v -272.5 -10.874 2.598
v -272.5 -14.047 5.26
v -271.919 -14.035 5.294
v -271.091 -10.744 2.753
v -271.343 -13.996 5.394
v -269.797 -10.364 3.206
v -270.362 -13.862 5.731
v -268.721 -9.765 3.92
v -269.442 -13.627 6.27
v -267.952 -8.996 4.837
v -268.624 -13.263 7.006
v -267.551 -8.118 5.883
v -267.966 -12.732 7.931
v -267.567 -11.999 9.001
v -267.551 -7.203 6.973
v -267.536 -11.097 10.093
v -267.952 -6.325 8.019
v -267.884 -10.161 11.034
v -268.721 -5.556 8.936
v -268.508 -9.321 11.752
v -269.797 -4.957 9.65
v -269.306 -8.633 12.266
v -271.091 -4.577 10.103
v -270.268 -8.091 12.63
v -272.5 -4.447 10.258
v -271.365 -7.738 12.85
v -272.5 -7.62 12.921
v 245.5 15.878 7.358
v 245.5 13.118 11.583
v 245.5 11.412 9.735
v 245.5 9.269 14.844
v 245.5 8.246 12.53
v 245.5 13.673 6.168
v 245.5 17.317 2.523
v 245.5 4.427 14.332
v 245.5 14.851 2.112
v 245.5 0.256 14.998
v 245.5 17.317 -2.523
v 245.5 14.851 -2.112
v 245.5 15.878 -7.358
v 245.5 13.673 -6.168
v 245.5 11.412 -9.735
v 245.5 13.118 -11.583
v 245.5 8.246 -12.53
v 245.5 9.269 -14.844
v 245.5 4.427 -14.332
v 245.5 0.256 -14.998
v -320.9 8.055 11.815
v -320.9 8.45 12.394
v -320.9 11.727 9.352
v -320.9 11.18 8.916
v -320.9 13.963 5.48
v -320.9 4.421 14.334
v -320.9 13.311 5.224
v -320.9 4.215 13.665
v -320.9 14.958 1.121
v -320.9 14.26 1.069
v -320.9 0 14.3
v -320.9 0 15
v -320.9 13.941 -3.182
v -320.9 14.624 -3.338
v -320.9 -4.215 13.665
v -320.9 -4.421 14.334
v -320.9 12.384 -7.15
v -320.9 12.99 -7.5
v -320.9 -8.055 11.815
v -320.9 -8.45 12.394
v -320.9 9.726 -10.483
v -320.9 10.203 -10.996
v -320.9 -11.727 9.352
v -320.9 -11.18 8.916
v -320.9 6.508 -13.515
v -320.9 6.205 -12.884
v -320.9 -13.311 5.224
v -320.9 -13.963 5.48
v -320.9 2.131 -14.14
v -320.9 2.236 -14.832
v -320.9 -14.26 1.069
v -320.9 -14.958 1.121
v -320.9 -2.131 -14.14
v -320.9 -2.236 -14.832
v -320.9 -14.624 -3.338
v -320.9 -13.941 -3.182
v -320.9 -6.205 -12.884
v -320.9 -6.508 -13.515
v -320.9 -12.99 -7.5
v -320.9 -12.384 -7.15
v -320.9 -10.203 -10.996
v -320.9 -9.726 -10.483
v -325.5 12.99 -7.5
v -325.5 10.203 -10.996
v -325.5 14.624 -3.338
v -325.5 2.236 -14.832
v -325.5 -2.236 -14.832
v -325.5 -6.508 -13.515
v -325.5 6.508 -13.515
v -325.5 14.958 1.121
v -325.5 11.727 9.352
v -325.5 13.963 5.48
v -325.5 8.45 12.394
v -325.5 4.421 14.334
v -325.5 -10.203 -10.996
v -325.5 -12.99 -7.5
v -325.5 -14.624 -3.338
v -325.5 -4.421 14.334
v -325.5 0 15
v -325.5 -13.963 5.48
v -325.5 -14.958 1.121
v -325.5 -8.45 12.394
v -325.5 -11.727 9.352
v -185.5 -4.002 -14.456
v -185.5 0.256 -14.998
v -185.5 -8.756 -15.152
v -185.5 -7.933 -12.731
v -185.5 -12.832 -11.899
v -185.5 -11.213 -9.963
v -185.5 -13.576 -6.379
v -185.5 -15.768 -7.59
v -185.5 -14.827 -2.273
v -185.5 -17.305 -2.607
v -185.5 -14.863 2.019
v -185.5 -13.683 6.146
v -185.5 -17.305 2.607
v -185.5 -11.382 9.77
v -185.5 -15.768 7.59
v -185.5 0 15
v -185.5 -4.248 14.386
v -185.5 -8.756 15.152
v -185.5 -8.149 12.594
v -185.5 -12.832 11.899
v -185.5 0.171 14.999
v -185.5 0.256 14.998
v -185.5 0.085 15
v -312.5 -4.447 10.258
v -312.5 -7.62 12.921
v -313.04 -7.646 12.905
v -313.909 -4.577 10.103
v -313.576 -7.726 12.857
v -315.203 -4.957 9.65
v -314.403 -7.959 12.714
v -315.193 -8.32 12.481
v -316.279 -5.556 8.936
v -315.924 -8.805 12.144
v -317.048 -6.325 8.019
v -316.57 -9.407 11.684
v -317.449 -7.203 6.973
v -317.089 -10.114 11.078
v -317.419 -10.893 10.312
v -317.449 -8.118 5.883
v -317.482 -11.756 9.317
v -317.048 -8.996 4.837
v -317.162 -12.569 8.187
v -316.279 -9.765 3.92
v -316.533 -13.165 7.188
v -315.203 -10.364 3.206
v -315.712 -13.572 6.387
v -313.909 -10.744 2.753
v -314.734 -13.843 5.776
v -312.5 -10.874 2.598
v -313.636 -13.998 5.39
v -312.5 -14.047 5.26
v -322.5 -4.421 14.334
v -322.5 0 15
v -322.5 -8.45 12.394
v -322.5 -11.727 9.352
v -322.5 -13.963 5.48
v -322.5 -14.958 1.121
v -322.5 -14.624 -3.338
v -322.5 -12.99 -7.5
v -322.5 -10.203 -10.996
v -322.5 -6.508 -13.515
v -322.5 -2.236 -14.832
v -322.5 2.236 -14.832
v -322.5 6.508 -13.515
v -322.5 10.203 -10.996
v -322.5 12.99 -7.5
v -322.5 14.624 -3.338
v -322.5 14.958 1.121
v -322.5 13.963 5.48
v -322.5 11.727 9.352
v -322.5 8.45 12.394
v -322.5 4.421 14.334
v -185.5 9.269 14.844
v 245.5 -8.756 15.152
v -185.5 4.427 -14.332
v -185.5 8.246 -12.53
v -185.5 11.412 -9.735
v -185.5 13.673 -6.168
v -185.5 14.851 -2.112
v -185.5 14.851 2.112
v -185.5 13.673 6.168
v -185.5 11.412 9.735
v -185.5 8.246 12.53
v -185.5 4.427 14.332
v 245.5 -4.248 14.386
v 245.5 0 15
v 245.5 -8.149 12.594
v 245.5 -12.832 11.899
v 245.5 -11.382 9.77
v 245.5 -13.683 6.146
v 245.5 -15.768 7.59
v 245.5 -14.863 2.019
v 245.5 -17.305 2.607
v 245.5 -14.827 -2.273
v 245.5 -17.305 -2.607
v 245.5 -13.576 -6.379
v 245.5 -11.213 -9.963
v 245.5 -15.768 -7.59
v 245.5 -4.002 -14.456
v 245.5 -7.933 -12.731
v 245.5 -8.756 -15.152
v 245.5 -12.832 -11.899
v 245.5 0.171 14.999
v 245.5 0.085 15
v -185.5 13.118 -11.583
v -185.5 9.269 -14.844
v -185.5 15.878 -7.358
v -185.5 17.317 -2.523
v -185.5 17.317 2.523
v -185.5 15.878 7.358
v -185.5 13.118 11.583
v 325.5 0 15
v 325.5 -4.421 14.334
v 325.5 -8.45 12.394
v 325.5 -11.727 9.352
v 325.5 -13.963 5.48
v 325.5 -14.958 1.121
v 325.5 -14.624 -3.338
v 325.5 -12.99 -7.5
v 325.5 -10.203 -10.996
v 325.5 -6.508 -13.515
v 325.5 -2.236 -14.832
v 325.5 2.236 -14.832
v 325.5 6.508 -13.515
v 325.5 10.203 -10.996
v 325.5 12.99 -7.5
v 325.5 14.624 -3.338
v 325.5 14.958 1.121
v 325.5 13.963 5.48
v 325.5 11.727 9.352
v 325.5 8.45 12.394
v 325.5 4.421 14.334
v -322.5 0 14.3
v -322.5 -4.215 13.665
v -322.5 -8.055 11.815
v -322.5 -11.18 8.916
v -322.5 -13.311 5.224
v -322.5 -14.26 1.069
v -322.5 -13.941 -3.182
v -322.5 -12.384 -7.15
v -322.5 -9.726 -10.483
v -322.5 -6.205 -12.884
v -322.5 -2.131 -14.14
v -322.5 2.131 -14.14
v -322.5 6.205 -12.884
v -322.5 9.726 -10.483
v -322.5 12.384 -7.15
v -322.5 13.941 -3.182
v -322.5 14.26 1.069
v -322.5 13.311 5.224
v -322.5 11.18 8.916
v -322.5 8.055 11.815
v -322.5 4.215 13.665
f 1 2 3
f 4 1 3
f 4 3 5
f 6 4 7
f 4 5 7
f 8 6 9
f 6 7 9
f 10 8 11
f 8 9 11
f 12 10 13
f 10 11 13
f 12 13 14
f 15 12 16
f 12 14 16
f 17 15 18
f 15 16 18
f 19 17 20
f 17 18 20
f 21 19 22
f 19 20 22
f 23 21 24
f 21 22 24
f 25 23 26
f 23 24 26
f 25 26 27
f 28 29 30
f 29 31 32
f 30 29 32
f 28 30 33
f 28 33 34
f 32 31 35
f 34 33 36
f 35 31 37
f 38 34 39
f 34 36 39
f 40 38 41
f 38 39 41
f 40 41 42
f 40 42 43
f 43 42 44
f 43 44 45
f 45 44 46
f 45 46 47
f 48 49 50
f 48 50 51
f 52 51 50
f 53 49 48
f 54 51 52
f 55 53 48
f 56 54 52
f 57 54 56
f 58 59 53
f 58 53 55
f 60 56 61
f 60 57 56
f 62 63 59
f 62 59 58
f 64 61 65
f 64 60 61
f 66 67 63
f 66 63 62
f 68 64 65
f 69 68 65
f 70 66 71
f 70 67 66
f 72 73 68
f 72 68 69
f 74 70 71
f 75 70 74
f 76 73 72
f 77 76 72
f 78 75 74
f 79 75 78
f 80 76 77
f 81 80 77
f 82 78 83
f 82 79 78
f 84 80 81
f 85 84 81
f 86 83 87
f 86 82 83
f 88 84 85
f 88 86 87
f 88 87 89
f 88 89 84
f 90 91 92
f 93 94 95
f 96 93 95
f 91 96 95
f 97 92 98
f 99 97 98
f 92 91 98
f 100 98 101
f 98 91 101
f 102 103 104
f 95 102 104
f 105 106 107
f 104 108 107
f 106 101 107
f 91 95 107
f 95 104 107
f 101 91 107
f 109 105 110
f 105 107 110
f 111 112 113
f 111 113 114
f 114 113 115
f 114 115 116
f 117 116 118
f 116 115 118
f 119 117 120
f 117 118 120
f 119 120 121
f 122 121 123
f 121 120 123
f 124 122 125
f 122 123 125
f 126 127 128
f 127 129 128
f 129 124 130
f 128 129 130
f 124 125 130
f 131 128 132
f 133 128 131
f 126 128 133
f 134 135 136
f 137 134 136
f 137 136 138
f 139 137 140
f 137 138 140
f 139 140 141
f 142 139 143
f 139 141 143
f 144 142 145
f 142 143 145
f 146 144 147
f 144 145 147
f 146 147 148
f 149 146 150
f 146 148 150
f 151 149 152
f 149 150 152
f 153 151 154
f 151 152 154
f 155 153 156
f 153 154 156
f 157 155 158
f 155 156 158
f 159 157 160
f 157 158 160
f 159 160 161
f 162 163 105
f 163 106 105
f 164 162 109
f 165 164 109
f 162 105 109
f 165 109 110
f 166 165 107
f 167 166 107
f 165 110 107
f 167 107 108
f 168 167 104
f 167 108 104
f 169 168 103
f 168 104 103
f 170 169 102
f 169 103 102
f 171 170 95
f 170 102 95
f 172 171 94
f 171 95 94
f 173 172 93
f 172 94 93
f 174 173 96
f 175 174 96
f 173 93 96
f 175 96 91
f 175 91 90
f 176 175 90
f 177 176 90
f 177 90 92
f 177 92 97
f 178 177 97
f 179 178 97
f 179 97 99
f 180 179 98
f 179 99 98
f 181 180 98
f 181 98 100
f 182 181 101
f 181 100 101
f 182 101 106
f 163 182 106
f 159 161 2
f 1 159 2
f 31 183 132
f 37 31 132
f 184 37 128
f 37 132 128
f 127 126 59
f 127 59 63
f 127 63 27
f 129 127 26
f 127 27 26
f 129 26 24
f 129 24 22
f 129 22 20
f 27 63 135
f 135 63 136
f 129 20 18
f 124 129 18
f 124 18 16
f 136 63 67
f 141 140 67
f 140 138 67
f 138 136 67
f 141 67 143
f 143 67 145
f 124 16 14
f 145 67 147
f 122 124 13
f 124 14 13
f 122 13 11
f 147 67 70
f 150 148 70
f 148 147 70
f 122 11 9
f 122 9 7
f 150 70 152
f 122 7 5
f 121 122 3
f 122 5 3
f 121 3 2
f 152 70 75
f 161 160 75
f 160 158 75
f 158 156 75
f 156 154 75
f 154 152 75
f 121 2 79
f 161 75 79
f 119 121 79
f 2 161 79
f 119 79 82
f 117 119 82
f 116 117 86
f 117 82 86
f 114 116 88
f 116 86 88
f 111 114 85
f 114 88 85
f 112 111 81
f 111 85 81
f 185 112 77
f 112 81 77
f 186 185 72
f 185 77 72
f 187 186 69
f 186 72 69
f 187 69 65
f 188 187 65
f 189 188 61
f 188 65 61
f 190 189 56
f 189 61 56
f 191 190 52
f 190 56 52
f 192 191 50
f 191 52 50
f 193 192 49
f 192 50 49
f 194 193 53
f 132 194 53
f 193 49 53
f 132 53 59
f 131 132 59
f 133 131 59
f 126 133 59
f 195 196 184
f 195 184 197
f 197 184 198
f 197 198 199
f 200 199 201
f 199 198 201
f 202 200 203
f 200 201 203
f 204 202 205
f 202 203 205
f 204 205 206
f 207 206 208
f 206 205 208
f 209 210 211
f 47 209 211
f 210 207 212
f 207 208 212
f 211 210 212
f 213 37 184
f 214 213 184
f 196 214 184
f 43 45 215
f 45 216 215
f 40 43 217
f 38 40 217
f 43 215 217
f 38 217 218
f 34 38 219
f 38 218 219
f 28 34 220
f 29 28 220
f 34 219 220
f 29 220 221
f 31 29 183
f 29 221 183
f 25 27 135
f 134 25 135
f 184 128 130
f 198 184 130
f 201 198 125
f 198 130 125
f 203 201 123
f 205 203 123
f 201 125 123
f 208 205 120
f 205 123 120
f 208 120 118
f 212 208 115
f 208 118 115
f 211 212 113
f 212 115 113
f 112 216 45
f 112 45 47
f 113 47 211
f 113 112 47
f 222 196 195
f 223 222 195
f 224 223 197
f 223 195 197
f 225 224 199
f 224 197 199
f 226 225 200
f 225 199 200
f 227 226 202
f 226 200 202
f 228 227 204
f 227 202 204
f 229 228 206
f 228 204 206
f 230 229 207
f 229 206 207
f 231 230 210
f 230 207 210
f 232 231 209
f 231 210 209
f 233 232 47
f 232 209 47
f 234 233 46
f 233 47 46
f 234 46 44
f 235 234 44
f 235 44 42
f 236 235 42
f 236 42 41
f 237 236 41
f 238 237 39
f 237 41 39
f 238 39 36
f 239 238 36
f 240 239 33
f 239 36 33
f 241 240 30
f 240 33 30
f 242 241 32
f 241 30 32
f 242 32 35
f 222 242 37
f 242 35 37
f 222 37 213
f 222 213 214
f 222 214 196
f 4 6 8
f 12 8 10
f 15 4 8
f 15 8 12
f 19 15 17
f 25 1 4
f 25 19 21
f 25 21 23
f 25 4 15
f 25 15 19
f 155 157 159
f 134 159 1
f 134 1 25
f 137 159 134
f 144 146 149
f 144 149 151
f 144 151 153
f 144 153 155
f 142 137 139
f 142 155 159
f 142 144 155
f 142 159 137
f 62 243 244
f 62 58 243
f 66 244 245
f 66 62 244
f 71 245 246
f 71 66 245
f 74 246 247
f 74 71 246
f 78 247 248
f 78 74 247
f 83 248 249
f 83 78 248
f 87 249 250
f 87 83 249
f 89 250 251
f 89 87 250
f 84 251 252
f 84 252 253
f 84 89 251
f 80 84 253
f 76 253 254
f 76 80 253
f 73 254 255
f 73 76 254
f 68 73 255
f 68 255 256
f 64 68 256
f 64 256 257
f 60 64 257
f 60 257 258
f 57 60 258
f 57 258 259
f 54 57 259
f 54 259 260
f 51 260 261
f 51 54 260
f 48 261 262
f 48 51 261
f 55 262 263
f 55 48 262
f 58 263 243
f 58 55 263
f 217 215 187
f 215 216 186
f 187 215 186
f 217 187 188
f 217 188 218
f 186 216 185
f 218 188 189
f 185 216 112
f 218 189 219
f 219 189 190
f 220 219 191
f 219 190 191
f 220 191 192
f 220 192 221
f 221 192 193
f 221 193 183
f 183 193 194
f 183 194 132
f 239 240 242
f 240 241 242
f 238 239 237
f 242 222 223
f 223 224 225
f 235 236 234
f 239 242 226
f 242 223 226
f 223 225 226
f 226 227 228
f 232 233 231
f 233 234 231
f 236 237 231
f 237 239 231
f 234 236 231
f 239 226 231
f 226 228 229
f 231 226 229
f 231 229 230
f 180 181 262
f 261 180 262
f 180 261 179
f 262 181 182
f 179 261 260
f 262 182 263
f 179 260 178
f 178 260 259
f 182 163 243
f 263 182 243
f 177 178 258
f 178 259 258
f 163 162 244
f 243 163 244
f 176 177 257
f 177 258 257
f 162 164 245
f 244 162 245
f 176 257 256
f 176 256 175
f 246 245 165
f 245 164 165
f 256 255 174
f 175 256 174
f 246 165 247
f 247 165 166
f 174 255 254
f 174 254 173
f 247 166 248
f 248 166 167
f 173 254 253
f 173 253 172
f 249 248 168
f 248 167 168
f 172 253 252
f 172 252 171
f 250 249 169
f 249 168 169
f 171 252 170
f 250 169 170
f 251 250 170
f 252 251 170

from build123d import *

# Parameters (mm, degrees)
KES_EKSTR_ZYON1_DEPTH = 431
IZIM3_W               = 1.6
IZIM3_H               = 0.7
KES_EKSTR_ZYON2_DEPTH = 5


with BuildPart() as part:
    # Çizim1 → Döndür1 (revolve)
    with BuildSketch(Plane.XY, mode=Mode.PRIVATE) as d_nd_r1_sk:
        Polygon((-325.5, 0), (325.5, 0), (325.5, 15), (245.5, 15), (245.5, 17.5), (-185.5, 17.5), (-185.5, 15), (-325.5, 15), align=None)
    revolve(d_nd_r1_sk.sketch.rotate(Axis((-325.5, 0, 0), (1, 0, 0)), 90), axis=Axis((-325.5, 0, 0), (1, 0, 0)))

    # Çizim2 → Kes-Ekstrüzyon1 (cut)
    with BuildSketch(Plane.ZY.offset(185.5)):
        with BuildLine():
            Line((-14.843898339, 9.268693657), (-15.15172785, -8.756434386))
            ThreePointArc((-15.15172785, -8.756434386), (-17.49744861, 0.298817908), (-14.843898339, 9.268693657))
        make_face()
        with BuildLine():
            Line((14.843898339, 9.268693657), (15.15172785, -8.756434386))
            ThreePointArc((15.15172785, -8.756434386), (17.49744861, 0.298817908), (14.843898339, 9.268693657))
        make_face()
    extrude(amount=-KES_EKSTR_ZYON1_DEPTH, mode=Mode.SUBTRACT)

    # Çizim3 → Kes-Döndür2 (revolve, cut)
    with BuildSketch(Plane(origin=(0, 0, 0), x_dir=(1, 0, 0), z_dir=(0, 1, 0)), mode=Mode.PRIVATE) as kes_d_nd_r2_sk:
        with Locations((-321.7, 14.65)):
            Rectangle(IZIM3_W, IZIM3_H)
    revolve(kes_d_nd_r2_sk.sketch.rotate(Axis((-325.5, 0, 0), (1, 0, 0)), 180), axis=Axis((-325.5, 0, 0), (1, 0, 0)), mode=Mode.SUBTRACT)

    # Çizim6 → Kes-Ekstrüzyon2 (cut)
    with BuildSketch(Plane(origin=(0, -11.490666647, 9.641814145), x_dir=(0, -0.642787609686535, -0.7660444431189818), z_dir=(0, 0.7660444431189817, -0.6427876096865349))):
        with BuildLine():
            Line((5, 312.5), (5, 272.5))
            ThreePointArc((5, 272.5), (0, 267.5), (-5, 272.5))
            Line((-5, 272.5), (-5, 312.5))
            ThreePointArc((-5, 312.5), (0, 317.5), (5, 312.5))
        make_face()
    extrude(amount=KES_EKSTR_ZYON2_DEPTH, mode=Mode.SUBTRACT)


solid = part.part
